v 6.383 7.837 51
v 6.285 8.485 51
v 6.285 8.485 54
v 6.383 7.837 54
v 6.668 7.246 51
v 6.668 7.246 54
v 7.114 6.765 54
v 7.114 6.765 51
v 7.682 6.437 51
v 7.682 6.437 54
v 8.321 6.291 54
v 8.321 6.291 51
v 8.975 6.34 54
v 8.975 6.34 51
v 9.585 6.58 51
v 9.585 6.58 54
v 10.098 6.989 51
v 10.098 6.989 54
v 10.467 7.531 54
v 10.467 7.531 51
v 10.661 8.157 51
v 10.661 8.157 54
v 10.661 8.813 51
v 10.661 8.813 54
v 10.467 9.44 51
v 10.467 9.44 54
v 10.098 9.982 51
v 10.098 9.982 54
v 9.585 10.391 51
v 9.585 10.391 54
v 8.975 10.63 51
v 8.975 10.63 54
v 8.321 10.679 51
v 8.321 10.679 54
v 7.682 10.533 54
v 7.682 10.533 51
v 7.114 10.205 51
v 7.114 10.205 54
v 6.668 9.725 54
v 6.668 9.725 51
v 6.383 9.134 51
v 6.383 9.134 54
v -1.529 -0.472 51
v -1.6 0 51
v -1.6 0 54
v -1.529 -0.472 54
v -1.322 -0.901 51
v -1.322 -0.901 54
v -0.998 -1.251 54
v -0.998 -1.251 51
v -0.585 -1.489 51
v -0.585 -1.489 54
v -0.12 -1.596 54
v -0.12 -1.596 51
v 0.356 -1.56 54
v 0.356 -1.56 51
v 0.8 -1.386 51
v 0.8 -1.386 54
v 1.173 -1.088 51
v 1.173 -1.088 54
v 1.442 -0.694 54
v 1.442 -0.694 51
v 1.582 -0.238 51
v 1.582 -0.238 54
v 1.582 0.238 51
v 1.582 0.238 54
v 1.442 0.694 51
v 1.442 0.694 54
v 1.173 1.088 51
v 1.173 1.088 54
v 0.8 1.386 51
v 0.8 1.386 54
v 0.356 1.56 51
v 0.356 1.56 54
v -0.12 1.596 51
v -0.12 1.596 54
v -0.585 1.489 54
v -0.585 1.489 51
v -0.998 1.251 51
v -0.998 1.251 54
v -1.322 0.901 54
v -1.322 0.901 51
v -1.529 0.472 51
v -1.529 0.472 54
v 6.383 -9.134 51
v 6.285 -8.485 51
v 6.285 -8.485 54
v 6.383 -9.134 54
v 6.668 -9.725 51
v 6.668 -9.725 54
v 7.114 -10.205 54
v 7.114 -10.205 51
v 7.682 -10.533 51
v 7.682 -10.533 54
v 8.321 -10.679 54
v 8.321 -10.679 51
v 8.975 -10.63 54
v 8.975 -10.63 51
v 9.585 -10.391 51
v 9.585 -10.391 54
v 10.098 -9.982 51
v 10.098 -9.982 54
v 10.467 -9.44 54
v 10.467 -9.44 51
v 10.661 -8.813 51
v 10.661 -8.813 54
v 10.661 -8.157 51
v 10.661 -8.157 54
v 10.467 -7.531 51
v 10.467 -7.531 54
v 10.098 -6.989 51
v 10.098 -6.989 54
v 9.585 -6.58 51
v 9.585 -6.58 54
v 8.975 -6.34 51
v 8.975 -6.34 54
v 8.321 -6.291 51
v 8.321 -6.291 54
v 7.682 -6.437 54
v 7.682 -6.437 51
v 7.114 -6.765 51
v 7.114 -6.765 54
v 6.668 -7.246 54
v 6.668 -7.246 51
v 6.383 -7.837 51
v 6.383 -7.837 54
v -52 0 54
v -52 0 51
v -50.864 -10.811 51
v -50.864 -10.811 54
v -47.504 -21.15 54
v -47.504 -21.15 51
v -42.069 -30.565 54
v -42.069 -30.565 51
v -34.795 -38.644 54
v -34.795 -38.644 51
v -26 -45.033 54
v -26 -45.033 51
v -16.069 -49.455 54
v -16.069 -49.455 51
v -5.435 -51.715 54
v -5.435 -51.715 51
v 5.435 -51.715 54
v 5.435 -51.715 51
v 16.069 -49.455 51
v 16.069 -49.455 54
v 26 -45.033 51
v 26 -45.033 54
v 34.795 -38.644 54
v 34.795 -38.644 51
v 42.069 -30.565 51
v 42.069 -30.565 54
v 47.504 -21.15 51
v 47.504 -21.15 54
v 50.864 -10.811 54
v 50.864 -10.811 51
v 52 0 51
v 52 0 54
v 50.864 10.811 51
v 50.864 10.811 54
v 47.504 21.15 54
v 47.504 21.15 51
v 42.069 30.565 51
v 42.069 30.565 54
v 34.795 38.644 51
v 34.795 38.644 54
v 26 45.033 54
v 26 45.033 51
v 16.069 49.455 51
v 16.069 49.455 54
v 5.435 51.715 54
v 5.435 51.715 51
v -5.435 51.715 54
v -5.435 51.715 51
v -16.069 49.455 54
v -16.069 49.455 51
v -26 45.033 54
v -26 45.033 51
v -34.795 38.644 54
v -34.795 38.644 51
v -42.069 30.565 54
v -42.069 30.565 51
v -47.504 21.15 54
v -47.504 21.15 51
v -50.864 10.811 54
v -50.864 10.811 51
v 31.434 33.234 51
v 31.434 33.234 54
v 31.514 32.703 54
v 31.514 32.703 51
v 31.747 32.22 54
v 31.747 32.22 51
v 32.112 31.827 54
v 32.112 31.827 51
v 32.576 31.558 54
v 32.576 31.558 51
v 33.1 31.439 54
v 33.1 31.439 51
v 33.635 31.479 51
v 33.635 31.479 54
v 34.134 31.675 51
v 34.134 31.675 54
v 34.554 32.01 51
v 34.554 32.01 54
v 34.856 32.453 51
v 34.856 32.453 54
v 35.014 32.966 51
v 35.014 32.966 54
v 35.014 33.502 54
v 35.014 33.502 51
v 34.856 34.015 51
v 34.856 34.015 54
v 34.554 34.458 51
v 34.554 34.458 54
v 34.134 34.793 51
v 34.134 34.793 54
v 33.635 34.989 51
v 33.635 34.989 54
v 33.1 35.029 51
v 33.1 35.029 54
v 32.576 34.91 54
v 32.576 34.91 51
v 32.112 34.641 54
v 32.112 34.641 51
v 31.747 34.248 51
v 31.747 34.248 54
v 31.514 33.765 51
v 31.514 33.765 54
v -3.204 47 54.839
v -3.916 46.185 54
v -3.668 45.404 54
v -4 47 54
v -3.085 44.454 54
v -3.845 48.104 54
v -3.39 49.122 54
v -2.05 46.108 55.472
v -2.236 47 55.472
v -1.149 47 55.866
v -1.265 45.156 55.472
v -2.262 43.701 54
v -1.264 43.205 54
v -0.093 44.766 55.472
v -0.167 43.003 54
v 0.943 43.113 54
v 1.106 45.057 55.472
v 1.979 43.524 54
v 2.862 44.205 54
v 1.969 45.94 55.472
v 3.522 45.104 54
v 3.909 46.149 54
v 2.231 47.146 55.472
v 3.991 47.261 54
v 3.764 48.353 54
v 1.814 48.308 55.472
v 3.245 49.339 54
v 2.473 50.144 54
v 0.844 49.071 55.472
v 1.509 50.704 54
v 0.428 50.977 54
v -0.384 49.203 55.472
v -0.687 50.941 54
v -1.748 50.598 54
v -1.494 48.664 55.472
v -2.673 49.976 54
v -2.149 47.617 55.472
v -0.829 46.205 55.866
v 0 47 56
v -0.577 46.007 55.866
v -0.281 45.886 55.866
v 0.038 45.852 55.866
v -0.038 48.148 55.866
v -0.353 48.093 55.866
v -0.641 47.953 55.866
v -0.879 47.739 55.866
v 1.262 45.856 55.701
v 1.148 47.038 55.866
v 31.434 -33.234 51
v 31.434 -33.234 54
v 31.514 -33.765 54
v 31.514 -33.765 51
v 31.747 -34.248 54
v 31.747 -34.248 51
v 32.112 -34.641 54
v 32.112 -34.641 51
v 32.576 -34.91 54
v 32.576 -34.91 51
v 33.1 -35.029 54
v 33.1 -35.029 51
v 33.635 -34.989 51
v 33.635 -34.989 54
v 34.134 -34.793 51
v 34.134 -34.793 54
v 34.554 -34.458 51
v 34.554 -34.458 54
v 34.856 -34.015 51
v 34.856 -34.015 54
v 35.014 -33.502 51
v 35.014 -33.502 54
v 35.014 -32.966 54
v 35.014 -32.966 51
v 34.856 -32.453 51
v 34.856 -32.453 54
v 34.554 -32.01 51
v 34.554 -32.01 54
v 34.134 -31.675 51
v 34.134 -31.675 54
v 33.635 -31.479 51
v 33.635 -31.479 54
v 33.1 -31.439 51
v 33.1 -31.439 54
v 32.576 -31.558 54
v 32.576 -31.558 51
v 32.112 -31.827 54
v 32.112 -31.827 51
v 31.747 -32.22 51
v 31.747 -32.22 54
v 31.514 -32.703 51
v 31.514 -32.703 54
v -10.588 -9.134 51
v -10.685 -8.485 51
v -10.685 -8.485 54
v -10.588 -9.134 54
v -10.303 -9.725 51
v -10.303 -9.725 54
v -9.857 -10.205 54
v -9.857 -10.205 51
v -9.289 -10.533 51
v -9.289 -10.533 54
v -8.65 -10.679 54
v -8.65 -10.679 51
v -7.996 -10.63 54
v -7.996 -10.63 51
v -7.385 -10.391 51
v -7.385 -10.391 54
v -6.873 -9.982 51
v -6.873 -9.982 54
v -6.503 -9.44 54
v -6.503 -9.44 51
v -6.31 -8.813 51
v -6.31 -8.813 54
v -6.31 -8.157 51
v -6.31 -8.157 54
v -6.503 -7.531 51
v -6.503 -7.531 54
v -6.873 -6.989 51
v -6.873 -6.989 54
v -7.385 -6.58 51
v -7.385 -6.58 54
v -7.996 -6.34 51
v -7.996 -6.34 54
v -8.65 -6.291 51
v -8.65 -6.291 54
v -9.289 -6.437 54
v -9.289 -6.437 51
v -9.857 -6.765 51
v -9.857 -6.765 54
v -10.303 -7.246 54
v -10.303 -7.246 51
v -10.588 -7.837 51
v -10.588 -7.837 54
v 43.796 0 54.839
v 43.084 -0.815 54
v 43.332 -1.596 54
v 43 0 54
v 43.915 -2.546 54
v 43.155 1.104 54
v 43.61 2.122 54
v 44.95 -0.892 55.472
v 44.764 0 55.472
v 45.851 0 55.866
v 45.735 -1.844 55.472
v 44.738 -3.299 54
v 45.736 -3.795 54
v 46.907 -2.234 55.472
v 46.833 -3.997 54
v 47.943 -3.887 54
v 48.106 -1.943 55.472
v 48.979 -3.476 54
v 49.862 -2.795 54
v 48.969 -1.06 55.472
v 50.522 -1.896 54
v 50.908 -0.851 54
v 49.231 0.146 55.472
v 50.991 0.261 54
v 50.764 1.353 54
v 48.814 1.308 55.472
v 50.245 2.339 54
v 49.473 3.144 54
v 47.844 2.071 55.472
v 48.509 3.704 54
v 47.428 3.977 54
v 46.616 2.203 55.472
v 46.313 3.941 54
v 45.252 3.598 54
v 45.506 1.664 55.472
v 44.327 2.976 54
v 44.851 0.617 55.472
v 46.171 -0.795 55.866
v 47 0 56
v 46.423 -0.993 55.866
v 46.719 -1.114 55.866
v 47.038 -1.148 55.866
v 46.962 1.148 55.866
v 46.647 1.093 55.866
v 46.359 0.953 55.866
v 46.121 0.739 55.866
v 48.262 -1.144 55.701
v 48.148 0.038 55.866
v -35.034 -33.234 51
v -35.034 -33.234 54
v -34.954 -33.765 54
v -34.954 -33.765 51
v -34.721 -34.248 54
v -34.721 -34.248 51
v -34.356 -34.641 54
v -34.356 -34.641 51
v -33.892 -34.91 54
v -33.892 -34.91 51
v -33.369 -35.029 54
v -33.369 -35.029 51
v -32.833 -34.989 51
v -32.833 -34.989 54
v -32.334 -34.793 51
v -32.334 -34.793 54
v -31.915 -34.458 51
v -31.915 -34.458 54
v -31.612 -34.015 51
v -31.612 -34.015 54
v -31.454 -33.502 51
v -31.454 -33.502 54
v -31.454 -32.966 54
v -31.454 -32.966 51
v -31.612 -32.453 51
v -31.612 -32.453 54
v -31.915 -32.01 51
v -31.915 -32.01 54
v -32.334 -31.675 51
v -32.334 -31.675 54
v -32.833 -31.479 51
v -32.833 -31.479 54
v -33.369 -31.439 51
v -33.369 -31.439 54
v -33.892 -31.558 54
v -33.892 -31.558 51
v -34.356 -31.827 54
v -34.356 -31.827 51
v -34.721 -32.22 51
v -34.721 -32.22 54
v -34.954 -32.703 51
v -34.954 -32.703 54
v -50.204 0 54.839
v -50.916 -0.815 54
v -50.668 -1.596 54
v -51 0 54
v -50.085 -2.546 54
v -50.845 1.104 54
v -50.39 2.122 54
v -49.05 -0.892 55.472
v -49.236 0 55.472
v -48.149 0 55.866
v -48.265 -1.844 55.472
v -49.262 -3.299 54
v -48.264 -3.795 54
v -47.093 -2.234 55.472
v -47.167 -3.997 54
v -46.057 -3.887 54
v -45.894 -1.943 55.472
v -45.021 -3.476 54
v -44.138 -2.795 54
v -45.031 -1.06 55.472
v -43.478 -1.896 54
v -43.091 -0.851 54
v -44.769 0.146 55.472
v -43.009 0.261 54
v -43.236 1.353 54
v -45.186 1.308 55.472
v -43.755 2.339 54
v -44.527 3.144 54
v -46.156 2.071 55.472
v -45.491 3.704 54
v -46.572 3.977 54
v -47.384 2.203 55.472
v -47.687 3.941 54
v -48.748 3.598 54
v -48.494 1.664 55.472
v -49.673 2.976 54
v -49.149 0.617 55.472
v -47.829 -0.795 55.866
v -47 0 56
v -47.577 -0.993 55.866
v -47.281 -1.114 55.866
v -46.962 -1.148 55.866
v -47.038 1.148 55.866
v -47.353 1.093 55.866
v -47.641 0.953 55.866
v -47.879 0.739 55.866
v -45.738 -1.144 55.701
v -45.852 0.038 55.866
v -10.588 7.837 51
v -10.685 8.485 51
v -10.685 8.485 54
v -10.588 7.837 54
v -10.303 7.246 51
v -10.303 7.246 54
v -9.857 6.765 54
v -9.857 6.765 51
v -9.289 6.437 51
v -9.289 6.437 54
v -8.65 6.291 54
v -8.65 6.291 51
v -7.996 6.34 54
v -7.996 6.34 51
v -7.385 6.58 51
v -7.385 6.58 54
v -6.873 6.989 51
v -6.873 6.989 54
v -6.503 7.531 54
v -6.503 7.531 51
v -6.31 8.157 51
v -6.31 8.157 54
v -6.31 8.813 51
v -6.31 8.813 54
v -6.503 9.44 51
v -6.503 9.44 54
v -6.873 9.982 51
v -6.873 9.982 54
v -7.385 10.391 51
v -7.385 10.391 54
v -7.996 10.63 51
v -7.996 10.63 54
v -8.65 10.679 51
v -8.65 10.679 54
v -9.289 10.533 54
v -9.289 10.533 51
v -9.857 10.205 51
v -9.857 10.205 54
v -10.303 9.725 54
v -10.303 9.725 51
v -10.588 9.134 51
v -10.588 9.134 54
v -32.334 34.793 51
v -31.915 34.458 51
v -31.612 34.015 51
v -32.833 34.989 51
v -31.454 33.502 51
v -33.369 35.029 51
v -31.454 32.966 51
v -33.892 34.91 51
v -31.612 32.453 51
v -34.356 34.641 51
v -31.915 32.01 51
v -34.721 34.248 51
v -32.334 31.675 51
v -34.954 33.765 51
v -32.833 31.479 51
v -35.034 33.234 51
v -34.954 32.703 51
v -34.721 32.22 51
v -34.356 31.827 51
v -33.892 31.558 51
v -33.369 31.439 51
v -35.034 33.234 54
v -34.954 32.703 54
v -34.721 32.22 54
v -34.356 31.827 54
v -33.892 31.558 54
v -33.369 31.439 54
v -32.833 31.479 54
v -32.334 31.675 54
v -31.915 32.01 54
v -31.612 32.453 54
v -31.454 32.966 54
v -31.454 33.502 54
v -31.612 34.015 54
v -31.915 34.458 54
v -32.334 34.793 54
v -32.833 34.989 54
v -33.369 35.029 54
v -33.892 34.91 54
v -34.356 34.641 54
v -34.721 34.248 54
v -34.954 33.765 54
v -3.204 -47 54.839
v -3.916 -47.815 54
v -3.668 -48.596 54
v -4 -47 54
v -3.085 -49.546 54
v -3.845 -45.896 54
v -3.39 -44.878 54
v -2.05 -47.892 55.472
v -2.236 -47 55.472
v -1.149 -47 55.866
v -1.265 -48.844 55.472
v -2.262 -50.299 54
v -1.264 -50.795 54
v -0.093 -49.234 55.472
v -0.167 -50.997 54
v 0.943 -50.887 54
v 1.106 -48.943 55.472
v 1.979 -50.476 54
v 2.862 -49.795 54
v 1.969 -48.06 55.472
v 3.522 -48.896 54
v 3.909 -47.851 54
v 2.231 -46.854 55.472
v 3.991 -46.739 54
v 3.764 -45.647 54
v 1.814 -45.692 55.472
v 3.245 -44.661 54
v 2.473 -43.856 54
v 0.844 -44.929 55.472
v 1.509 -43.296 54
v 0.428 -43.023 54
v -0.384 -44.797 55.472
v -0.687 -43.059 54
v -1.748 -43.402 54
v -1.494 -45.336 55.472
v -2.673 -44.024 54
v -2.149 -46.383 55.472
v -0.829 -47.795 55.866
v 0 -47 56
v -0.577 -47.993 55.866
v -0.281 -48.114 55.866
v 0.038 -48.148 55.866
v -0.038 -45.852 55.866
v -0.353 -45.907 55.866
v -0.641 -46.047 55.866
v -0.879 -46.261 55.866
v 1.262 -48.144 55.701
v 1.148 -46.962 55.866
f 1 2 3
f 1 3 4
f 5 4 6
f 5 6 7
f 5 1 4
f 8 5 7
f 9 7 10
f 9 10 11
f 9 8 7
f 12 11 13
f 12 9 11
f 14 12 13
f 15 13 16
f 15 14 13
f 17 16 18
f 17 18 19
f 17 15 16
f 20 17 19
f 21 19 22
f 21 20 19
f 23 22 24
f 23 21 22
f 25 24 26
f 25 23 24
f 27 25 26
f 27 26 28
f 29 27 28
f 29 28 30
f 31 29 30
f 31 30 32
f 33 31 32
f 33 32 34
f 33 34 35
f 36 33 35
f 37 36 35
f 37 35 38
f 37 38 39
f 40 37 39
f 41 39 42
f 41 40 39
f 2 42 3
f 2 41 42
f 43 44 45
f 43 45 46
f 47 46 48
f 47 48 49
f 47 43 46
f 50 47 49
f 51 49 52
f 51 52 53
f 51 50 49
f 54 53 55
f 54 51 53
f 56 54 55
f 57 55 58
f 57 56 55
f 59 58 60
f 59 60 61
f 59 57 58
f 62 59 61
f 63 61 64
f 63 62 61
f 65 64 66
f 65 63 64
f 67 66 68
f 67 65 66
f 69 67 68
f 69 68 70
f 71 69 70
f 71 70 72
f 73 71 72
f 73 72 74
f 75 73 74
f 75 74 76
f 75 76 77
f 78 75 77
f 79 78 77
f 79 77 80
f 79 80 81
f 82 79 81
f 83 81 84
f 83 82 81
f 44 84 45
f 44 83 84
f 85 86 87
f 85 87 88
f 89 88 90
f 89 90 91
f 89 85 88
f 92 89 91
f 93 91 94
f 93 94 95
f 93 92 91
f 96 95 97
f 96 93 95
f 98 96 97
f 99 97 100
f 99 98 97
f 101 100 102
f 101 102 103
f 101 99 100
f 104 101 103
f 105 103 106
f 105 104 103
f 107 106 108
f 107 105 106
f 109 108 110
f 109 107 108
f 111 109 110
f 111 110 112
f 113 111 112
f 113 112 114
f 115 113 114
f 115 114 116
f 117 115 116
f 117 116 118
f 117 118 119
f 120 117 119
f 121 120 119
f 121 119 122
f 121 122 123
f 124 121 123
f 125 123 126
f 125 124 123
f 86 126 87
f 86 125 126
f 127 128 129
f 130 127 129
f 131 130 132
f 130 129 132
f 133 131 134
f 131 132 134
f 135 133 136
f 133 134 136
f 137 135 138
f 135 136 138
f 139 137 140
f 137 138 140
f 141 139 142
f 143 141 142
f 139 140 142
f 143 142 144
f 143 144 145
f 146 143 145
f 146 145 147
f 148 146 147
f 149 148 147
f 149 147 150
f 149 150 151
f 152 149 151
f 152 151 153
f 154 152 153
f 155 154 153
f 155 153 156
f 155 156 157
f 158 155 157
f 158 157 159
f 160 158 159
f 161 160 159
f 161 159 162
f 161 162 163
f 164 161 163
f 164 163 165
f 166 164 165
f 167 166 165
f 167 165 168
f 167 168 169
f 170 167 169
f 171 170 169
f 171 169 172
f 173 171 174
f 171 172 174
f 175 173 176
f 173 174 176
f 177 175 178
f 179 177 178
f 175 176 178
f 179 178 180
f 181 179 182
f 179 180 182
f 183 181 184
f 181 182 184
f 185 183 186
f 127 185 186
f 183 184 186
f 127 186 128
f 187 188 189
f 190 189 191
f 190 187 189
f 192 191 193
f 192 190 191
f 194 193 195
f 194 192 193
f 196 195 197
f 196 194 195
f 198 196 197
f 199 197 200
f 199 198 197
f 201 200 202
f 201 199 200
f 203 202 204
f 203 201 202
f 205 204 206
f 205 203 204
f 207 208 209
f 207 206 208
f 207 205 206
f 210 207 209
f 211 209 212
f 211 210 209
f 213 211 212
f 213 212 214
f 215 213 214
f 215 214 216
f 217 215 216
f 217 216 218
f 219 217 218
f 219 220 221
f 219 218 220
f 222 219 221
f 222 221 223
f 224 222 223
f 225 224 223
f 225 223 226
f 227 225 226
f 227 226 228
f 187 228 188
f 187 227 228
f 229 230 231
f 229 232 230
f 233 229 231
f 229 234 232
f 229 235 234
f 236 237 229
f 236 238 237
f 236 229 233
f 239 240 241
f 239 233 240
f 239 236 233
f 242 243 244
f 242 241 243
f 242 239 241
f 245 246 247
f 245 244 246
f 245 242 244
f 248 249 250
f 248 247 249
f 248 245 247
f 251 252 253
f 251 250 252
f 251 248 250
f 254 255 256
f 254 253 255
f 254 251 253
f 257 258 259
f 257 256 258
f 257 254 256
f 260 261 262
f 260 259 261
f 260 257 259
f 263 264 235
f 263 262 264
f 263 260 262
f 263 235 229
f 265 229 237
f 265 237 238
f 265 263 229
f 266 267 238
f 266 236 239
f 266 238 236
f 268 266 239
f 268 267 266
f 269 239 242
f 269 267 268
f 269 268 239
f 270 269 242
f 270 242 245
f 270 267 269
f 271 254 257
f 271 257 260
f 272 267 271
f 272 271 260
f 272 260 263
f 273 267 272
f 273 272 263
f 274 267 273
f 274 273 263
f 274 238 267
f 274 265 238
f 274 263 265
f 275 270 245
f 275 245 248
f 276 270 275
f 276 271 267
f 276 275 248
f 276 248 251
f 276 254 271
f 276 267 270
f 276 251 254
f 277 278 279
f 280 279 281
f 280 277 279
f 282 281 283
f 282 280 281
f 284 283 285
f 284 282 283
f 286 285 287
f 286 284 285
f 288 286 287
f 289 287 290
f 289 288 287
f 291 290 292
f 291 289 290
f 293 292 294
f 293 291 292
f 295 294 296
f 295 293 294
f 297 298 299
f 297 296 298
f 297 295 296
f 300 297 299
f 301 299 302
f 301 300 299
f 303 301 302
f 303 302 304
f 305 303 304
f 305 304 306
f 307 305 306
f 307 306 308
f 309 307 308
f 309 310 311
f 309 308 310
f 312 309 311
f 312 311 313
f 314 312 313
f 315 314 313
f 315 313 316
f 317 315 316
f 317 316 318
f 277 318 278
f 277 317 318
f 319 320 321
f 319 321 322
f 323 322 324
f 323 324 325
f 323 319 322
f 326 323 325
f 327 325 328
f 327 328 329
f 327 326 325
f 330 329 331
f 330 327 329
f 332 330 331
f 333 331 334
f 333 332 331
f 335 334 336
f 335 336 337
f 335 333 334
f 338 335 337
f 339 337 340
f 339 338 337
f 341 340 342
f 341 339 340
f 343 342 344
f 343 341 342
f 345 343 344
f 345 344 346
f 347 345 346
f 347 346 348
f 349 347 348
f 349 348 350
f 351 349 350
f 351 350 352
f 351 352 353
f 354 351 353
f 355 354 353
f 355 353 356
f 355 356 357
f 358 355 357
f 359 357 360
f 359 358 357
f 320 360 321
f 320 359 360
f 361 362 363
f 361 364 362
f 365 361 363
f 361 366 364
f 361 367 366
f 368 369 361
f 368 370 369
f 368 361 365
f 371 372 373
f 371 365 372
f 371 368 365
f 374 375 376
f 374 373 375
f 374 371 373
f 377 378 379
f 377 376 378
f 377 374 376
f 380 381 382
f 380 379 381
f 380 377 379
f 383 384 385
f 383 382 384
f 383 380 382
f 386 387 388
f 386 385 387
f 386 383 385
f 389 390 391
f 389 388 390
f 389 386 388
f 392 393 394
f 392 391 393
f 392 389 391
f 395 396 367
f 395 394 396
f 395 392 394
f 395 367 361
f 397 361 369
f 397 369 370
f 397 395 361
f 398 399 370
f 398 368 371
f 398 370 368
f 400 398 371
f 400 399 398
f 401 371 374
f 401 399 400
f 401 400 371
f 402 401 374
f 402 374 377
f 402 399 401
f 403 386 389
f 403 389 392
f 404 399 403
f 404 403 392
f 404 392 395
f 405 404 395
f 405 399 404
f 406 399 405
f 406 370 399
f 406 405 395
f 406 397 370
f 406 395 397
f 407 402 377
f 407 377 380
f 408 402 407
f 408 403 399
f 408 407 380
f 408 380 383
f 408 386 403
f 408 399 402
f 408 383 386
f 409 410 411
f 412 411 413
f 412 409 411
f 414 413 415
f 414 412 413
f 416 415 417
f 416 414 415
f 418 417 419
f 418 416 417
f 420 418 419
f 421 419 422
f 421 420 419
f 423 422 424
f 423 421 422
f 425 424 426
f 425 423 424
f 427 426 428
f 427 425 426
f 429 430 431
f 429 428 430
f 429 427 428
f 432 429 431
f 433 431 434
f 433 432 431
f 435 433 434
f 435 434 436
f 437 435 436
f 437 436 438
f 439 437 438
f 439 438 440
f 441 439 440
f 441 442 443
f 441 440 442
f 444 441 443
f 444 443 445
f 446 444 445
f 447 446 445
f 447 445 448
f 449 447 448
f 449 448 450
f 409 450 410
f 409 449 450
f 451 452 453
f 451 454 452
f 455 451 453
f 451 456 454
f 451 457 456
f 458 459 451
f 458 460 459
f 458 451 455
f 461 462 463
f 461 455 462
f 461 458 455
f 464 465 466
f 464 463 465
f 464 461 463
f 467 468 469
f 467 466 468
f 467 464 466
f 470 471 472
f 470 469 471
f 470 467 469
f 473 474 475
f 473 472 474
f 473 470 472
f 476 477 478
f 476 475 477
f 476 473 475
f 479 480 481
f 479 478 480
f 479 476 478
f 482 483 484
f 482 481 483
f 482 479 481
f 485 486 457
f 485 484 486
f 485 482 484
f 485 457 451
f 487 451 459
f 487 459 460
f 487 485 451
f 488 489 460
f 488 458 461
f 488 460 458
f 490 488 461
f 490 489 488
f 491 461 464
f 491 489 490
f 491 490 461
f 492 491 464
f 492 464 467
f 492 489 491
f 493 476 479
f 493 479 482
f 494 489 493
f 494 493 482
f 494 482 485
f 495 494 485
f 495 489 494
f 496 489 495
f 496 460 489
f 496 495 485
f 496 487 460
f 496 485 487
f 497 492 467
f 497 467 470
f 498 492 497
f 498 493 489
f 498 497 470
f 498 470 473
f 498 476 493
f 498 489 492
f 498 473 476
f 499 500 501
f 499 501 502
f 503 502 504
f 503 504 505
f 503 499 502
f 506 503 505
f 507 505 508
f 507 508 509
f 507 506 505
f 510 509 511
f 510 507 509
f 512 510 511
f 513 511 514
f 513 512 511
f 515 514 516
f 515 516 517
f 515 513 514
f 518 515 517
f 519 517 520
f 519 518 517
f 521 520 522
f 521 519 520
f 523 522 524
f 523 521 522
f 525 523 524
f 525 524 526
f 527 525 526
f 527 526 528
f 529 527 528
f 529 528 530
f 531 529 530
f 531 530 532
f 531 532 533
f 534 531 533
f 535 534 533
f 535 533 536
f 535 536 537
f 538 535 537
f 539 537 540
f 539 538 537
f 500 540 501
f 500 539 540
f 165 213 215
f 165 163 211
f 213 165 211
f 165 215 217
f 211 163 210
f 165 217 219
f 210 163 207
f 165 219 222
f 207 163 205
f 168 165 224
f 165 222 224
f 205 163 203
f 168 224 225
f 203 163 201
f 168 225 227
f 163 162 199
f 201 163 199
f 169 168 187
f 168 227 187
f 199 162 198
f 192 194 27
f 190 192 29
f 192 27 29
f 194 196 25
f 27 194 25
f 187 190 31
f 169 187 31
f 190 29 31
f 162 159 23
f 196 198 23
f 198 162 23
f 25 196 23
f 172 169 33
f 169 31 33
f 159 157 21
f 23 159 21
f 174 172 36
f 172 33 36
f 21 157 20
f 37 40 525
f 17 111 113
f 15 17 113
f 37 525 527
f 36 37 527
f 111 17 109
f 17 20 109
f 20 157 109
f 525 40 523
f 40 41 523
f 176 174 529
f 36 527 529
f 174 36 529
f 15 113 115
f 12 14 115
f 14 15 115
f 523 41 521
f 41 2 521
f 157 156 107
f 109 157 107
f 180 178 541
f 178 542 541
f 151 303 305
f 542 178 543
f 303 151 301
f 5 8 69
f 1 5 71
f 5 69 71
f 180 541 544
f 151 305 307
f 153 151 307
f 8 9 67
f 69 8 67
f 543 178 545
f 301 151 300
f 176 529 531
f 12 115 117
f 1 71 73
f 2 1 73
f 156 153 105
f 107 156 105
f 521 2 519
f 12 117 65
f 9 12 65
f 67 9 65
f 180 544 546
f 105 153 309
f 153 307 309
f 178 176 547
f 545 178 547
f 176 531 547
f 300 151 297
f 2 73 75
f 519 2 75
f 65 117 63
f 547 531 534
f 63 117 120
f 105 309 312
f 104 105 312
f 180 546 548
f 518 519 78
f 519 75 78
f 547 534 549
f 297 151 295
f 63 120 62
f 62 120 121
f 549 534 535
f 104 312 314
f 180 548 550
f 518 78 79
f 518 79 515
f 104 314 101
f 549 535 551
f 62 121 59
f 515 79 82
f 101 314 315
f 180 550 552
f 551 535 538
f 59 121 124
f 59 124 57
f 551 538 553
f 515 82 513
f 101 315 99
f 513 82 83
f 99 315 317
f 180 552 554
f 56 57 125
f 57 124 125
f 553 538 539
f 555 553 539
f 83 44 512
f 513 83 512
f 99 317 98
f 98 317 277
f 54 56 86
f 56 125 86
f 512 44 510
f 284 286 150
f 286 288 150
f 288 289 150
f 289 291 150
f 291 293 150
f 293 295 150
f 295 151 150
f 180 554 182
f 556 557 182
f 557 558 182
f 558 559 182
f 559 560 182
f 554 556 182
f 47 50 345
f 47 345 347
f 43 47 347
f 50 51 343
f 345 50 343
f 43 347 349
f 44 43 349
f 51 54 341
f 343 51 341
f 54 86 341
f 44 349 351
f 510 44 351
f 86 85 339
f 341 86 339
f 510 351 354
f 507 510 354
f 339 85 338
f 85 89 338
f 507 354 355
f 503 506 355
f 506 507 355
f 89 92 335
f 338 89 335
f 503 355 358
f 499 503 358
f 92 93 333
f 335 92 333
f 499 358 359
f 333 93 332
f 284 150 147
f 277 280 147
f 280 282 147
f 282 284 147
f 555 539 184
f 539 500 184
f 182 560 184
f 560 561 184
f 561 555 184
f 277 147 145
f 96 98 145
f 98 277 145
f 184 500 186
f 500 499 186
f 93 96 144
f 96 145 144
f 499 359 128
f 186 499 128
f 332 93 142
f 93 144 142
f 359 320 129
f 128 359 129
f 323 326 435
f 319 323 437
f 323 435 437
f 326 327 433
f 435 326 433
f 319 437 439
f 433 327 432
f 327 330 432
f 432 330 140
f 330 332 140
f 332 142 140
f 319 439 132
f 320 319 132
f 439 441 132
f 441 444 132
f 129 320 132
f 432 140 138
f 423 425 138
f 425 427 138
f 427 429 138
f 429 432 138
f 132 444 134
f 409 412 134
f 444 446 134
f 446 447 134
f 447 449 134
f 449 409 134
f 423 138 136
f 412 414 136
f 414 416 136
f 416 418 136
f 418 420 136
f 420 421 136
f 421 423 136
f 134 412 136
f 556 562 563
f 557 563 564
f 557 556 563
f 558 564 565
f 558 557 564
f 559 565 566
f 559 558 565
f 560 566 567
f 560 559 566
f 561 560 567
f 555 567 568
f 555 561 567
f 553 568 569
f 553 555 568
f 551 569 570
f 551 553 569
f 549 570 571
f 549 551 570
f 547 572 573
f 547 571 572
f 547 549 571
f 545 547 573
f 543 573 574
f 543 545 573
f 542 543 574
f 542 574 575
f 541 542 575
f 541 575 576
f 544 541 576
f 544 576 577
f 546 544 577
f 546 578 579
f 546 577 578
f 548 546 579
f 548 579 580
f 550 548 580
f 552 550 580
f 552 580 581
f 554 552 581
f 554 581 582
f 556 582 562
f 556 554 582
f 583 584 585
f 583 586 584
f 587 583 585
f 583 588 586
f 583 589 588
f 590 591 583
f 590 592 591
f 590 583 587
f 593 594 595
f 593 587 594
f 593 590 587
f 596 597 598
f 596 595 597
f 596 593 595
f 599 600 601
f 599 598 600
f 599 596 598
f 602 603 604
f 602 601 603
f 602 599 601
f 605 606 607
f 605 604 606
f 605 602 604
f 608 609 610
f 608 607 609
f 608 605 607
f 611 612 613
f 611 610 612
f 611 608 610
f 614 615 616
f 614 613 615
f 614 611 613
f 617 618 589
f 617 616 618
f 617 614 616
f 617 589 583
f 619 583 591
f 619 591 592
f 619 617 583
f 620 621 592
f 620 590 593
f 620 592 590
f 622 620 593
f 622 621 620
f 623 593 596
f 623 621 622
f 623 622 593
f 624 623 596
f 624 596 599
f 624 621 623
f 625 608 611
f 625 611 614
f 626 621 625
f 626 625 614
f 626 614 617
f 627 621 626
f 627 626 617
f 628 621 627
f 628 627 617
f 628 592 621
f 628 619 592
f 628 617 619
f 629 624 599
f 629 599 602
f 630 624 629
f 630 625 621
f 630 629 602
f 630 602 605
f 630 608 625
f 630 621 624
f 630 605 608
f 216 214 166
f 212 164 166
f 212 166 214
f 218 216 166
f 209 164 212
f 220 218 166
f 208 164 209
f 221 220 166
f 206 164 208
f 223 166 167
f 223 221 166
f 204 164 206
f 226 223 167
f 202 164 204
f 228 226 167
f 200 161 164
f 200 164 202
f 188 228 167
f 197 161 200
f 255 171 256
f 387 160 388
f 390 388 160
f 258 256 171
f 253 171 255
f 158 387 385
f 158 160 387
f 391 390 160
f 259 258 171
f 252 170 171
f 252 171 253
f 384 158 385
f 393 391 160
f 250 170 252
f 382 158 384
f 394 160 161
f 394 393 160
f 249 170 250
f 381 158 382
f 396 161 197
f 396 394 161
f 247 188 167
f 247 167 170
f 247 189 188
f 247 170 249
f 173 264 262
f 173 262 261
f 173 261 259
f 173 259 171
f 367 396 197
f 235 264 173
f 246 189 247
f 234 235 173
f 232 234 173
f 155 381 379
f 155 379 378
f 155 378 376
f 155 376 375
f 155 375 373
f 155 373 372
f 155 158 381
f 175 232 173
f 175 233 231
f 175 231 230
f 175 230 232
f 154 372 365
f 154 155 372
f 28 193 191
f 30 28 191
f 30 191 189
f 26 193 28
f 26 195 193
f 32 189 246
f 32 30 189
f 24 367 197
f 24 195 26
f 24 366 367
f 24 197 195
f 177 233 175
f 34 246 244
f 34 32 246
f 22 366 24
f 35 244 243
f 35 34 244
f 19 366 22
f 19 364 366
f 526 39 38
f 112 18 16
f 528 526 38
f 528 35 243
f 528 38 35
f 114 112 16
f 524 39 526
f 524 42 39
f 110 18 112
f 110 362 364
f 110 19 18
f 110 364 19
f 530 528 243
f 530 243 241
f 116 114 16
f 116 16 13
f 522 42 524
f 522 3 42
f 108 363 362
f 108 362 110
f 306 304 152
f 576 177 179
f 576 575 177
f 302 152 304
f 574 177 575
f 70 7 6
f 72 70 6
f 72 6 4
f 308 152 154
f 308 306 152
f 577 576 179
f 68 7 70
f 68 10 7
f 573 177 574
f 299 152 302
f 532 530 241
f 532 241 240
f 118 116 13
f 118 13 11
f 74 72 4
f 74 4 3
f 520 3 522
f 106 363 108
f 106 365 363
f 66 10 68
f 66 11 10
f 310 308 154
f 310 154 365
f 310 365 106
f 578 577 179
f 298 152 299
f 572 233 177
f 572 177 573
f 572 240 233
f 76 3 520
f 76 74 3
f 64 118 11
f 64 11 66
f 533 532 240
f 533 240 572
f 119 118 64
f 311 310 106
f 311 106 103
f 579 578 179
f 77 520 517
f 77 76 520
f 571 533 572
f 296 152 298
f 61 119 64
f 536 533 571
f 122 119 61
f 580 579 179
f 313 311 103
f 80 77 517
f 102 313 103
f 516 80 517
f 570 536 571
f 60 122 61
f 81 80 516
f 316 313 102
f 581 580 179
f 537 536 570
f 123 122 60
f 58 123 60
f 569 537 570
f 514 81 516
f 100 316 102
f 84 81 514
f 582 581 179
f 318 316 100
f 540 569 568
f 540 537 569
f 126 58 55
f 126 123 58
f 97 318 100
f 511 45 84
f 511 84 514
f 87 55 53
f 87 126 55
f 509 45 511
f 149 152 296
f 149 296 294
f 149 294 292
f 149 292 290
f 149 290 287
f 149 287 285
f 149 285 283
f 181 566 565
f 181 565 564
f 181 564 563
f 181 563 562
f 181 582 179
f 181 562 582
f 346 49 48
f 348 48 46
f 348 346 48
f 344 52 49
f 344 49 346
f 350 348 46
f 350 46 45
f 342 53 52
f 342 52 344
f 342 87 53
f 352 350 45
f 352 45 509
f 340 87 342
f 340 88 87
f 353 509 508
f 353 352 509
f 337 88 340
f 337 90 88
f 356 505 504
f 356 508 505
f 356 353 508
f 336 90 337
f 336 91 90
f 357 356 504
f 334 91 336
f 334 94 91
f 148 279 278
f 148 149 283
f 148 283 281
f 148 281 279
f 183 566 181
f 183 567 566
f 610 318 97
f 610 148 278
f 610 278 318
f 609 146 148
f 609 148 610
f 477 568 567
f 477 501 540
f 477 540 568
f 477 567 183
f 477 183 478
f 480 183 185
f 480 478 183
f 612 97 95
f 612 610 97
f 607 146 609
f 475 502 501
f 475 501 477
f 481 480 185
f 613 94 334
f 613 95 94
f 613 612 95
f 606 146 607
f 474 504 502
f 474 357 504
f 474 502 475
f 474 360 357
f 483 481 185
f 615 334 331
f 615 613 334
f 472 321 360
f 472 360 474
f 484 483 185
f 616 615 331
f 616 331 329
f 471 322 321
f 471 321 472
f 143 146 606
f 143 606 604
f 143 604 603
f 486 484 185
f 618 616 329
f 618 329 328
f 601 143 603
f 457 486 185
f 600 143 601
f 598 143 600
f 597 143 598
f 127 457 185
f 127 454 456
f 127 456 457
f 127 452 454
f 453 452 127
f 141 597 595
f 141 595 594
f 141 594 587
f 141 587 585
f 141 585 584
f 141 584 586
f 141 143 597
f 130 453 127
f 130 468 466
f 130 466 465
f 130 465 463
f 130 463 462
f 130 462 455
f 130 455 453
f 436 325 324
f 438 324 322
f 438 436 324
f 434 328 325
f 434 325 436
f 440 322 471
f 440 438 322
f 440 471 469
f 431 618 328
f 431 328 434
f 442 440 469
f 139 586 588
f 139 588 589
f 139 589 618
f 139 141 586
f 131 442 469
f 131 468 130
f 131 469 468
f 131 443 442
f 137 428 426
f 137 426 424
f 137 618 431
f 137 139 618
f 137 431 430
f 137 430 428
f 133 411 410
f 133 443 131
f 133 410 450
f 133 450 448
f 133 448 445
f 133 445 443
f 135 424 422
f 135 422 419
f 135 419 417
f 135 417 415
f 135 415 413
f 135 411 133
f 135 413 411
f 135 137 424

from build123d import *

# Parameters (mm, degrees)
SKETCH004_R             = 52
SKETCH004_R_2           = 1.6
SKETCH004_R_3           = 2.2
PAD003_DEPTH            = 3
SKETCH006_R             = 1.8
POCKET001_DEPTH         = 0.001
POCKET001_DEPTH_BACK    = 3.001
BODY002_PLACEMENT_ANGLE = 180


with BuildPart() as part:
    # Sketch004 → Pad003 (new body)
    with BuildSketch(Plane.XY):
        Circle(SKETCH004_R)
        Circle(SKETCH004_R_2, mode=Mode.SUBTRACT)
        with Locations((8.485281, 8.485281)):
            Circle(SKETCH004_R_3, mode=Mode.SUBTRACT)
        with Locations((-8.485281, 8.485281)):
            Circle(SKETCH004_R_3, mode=Mode.SUBTRACT)
        with Locations((-8.485281, -8.485281)):
            Circle(SKETCH004_R_3, mode=Mode.SUBTRACT)
        with Locations((8.485281, -8.485281)):
            Circle(SKETCH004_R_3, mode=Mode.SUBTRACT)
    extrude(amount=PAD003_DEPTH)

    # Sketch006 → Pocket001 (cut, two sides)
    with BuildSketch(Plane.XY) as pocket001_sk:
        with Locations((-33.234019, 33.234019)):
            Circle(SKETCH006_R)
        with Locations((-33.234019, -33.234019)):
            Circle(SKETCH006_R)
        with Locations((33.234019, -33.234019)):
            Circle(SKETCH006_R)
        with Locations((33.234019, 33.234019)):
            Circle(SKETCH006_R)
    extrude(amount=-POCKET001_DEPTH, mode=Mode.SUBTRACT)
    extrude(pocket001_sk.sketch, amount=POCKET001_DEPTH_BACK, mode=Mode.SUBTRACT)

    # Sphere → Sphere (revolve)
    with BuildSketch(Plane.XZ.offset(-47)):
        with BuildLine():
            ThreePointArc((5, 0), (3.535534, 3.535534), (0, 5))
            Line((0, 5), (0, 0))
            Line((0, 0), (5, 0))
        make_face()
    revolve(axis=Axis((0, 47, 0), (0, 0, 1)))

    # Sphere001 → Sphere001 (revolve)
    with BuildSketch(Plane.XZ.offset(47)):
        with BuildLine():
            ThreePointArc((5, 0), (3.535534, 3.535534), (0, 5))
            Line((0, 5), (0, 0))
            Line((0, 0), (5, 0))
        make_face()
    revolve(axis=Axis((0, -47, 0), (0, 0, 1)))

    # Sphere002 → Sphere002 (revolve)
    with BuildSketch(Plane(origin=(47, 0, 0), x_dir=(1, 0, 0), z_dir=(0, -1, 0))):
        with BuildLine():
            ThreePointArc((5, 0), (3.535534, 3.535534), (0, 5))
            Line((0, 5), (0, 0))
            Line((0, 0), (5, 0))
        make_face()
    revolve(axis=Axis((47, 0, 0), (0, 0, 1)))

    # Sphere003 → Sphere003 (revolve)
    with BuildSketch(Plane(origin=(-47, 0, 0), x_dir=(1, 0, 0), z_dir=(0, -1, 0))):
        with BuildLine():
            ThreePointArc((5, 0), (3.535534, 3.535534), (0, 5))
            Line((0, 5), (0, 0))
            Line((0, 0), (5, 0))
        make_face()
    revolve(axis=Axis((-47, 0, 0), (0, 0, 1)))


with BuildPart() as part_1:
    # Body002 placement: moved
    add(part.part.moved(Location((0, 0, 51))).rotate(Axis((0, 0, 51), (0, 0, -1)), BODY002_PLACEMENT_ANGLE))


solid = part_1.part
